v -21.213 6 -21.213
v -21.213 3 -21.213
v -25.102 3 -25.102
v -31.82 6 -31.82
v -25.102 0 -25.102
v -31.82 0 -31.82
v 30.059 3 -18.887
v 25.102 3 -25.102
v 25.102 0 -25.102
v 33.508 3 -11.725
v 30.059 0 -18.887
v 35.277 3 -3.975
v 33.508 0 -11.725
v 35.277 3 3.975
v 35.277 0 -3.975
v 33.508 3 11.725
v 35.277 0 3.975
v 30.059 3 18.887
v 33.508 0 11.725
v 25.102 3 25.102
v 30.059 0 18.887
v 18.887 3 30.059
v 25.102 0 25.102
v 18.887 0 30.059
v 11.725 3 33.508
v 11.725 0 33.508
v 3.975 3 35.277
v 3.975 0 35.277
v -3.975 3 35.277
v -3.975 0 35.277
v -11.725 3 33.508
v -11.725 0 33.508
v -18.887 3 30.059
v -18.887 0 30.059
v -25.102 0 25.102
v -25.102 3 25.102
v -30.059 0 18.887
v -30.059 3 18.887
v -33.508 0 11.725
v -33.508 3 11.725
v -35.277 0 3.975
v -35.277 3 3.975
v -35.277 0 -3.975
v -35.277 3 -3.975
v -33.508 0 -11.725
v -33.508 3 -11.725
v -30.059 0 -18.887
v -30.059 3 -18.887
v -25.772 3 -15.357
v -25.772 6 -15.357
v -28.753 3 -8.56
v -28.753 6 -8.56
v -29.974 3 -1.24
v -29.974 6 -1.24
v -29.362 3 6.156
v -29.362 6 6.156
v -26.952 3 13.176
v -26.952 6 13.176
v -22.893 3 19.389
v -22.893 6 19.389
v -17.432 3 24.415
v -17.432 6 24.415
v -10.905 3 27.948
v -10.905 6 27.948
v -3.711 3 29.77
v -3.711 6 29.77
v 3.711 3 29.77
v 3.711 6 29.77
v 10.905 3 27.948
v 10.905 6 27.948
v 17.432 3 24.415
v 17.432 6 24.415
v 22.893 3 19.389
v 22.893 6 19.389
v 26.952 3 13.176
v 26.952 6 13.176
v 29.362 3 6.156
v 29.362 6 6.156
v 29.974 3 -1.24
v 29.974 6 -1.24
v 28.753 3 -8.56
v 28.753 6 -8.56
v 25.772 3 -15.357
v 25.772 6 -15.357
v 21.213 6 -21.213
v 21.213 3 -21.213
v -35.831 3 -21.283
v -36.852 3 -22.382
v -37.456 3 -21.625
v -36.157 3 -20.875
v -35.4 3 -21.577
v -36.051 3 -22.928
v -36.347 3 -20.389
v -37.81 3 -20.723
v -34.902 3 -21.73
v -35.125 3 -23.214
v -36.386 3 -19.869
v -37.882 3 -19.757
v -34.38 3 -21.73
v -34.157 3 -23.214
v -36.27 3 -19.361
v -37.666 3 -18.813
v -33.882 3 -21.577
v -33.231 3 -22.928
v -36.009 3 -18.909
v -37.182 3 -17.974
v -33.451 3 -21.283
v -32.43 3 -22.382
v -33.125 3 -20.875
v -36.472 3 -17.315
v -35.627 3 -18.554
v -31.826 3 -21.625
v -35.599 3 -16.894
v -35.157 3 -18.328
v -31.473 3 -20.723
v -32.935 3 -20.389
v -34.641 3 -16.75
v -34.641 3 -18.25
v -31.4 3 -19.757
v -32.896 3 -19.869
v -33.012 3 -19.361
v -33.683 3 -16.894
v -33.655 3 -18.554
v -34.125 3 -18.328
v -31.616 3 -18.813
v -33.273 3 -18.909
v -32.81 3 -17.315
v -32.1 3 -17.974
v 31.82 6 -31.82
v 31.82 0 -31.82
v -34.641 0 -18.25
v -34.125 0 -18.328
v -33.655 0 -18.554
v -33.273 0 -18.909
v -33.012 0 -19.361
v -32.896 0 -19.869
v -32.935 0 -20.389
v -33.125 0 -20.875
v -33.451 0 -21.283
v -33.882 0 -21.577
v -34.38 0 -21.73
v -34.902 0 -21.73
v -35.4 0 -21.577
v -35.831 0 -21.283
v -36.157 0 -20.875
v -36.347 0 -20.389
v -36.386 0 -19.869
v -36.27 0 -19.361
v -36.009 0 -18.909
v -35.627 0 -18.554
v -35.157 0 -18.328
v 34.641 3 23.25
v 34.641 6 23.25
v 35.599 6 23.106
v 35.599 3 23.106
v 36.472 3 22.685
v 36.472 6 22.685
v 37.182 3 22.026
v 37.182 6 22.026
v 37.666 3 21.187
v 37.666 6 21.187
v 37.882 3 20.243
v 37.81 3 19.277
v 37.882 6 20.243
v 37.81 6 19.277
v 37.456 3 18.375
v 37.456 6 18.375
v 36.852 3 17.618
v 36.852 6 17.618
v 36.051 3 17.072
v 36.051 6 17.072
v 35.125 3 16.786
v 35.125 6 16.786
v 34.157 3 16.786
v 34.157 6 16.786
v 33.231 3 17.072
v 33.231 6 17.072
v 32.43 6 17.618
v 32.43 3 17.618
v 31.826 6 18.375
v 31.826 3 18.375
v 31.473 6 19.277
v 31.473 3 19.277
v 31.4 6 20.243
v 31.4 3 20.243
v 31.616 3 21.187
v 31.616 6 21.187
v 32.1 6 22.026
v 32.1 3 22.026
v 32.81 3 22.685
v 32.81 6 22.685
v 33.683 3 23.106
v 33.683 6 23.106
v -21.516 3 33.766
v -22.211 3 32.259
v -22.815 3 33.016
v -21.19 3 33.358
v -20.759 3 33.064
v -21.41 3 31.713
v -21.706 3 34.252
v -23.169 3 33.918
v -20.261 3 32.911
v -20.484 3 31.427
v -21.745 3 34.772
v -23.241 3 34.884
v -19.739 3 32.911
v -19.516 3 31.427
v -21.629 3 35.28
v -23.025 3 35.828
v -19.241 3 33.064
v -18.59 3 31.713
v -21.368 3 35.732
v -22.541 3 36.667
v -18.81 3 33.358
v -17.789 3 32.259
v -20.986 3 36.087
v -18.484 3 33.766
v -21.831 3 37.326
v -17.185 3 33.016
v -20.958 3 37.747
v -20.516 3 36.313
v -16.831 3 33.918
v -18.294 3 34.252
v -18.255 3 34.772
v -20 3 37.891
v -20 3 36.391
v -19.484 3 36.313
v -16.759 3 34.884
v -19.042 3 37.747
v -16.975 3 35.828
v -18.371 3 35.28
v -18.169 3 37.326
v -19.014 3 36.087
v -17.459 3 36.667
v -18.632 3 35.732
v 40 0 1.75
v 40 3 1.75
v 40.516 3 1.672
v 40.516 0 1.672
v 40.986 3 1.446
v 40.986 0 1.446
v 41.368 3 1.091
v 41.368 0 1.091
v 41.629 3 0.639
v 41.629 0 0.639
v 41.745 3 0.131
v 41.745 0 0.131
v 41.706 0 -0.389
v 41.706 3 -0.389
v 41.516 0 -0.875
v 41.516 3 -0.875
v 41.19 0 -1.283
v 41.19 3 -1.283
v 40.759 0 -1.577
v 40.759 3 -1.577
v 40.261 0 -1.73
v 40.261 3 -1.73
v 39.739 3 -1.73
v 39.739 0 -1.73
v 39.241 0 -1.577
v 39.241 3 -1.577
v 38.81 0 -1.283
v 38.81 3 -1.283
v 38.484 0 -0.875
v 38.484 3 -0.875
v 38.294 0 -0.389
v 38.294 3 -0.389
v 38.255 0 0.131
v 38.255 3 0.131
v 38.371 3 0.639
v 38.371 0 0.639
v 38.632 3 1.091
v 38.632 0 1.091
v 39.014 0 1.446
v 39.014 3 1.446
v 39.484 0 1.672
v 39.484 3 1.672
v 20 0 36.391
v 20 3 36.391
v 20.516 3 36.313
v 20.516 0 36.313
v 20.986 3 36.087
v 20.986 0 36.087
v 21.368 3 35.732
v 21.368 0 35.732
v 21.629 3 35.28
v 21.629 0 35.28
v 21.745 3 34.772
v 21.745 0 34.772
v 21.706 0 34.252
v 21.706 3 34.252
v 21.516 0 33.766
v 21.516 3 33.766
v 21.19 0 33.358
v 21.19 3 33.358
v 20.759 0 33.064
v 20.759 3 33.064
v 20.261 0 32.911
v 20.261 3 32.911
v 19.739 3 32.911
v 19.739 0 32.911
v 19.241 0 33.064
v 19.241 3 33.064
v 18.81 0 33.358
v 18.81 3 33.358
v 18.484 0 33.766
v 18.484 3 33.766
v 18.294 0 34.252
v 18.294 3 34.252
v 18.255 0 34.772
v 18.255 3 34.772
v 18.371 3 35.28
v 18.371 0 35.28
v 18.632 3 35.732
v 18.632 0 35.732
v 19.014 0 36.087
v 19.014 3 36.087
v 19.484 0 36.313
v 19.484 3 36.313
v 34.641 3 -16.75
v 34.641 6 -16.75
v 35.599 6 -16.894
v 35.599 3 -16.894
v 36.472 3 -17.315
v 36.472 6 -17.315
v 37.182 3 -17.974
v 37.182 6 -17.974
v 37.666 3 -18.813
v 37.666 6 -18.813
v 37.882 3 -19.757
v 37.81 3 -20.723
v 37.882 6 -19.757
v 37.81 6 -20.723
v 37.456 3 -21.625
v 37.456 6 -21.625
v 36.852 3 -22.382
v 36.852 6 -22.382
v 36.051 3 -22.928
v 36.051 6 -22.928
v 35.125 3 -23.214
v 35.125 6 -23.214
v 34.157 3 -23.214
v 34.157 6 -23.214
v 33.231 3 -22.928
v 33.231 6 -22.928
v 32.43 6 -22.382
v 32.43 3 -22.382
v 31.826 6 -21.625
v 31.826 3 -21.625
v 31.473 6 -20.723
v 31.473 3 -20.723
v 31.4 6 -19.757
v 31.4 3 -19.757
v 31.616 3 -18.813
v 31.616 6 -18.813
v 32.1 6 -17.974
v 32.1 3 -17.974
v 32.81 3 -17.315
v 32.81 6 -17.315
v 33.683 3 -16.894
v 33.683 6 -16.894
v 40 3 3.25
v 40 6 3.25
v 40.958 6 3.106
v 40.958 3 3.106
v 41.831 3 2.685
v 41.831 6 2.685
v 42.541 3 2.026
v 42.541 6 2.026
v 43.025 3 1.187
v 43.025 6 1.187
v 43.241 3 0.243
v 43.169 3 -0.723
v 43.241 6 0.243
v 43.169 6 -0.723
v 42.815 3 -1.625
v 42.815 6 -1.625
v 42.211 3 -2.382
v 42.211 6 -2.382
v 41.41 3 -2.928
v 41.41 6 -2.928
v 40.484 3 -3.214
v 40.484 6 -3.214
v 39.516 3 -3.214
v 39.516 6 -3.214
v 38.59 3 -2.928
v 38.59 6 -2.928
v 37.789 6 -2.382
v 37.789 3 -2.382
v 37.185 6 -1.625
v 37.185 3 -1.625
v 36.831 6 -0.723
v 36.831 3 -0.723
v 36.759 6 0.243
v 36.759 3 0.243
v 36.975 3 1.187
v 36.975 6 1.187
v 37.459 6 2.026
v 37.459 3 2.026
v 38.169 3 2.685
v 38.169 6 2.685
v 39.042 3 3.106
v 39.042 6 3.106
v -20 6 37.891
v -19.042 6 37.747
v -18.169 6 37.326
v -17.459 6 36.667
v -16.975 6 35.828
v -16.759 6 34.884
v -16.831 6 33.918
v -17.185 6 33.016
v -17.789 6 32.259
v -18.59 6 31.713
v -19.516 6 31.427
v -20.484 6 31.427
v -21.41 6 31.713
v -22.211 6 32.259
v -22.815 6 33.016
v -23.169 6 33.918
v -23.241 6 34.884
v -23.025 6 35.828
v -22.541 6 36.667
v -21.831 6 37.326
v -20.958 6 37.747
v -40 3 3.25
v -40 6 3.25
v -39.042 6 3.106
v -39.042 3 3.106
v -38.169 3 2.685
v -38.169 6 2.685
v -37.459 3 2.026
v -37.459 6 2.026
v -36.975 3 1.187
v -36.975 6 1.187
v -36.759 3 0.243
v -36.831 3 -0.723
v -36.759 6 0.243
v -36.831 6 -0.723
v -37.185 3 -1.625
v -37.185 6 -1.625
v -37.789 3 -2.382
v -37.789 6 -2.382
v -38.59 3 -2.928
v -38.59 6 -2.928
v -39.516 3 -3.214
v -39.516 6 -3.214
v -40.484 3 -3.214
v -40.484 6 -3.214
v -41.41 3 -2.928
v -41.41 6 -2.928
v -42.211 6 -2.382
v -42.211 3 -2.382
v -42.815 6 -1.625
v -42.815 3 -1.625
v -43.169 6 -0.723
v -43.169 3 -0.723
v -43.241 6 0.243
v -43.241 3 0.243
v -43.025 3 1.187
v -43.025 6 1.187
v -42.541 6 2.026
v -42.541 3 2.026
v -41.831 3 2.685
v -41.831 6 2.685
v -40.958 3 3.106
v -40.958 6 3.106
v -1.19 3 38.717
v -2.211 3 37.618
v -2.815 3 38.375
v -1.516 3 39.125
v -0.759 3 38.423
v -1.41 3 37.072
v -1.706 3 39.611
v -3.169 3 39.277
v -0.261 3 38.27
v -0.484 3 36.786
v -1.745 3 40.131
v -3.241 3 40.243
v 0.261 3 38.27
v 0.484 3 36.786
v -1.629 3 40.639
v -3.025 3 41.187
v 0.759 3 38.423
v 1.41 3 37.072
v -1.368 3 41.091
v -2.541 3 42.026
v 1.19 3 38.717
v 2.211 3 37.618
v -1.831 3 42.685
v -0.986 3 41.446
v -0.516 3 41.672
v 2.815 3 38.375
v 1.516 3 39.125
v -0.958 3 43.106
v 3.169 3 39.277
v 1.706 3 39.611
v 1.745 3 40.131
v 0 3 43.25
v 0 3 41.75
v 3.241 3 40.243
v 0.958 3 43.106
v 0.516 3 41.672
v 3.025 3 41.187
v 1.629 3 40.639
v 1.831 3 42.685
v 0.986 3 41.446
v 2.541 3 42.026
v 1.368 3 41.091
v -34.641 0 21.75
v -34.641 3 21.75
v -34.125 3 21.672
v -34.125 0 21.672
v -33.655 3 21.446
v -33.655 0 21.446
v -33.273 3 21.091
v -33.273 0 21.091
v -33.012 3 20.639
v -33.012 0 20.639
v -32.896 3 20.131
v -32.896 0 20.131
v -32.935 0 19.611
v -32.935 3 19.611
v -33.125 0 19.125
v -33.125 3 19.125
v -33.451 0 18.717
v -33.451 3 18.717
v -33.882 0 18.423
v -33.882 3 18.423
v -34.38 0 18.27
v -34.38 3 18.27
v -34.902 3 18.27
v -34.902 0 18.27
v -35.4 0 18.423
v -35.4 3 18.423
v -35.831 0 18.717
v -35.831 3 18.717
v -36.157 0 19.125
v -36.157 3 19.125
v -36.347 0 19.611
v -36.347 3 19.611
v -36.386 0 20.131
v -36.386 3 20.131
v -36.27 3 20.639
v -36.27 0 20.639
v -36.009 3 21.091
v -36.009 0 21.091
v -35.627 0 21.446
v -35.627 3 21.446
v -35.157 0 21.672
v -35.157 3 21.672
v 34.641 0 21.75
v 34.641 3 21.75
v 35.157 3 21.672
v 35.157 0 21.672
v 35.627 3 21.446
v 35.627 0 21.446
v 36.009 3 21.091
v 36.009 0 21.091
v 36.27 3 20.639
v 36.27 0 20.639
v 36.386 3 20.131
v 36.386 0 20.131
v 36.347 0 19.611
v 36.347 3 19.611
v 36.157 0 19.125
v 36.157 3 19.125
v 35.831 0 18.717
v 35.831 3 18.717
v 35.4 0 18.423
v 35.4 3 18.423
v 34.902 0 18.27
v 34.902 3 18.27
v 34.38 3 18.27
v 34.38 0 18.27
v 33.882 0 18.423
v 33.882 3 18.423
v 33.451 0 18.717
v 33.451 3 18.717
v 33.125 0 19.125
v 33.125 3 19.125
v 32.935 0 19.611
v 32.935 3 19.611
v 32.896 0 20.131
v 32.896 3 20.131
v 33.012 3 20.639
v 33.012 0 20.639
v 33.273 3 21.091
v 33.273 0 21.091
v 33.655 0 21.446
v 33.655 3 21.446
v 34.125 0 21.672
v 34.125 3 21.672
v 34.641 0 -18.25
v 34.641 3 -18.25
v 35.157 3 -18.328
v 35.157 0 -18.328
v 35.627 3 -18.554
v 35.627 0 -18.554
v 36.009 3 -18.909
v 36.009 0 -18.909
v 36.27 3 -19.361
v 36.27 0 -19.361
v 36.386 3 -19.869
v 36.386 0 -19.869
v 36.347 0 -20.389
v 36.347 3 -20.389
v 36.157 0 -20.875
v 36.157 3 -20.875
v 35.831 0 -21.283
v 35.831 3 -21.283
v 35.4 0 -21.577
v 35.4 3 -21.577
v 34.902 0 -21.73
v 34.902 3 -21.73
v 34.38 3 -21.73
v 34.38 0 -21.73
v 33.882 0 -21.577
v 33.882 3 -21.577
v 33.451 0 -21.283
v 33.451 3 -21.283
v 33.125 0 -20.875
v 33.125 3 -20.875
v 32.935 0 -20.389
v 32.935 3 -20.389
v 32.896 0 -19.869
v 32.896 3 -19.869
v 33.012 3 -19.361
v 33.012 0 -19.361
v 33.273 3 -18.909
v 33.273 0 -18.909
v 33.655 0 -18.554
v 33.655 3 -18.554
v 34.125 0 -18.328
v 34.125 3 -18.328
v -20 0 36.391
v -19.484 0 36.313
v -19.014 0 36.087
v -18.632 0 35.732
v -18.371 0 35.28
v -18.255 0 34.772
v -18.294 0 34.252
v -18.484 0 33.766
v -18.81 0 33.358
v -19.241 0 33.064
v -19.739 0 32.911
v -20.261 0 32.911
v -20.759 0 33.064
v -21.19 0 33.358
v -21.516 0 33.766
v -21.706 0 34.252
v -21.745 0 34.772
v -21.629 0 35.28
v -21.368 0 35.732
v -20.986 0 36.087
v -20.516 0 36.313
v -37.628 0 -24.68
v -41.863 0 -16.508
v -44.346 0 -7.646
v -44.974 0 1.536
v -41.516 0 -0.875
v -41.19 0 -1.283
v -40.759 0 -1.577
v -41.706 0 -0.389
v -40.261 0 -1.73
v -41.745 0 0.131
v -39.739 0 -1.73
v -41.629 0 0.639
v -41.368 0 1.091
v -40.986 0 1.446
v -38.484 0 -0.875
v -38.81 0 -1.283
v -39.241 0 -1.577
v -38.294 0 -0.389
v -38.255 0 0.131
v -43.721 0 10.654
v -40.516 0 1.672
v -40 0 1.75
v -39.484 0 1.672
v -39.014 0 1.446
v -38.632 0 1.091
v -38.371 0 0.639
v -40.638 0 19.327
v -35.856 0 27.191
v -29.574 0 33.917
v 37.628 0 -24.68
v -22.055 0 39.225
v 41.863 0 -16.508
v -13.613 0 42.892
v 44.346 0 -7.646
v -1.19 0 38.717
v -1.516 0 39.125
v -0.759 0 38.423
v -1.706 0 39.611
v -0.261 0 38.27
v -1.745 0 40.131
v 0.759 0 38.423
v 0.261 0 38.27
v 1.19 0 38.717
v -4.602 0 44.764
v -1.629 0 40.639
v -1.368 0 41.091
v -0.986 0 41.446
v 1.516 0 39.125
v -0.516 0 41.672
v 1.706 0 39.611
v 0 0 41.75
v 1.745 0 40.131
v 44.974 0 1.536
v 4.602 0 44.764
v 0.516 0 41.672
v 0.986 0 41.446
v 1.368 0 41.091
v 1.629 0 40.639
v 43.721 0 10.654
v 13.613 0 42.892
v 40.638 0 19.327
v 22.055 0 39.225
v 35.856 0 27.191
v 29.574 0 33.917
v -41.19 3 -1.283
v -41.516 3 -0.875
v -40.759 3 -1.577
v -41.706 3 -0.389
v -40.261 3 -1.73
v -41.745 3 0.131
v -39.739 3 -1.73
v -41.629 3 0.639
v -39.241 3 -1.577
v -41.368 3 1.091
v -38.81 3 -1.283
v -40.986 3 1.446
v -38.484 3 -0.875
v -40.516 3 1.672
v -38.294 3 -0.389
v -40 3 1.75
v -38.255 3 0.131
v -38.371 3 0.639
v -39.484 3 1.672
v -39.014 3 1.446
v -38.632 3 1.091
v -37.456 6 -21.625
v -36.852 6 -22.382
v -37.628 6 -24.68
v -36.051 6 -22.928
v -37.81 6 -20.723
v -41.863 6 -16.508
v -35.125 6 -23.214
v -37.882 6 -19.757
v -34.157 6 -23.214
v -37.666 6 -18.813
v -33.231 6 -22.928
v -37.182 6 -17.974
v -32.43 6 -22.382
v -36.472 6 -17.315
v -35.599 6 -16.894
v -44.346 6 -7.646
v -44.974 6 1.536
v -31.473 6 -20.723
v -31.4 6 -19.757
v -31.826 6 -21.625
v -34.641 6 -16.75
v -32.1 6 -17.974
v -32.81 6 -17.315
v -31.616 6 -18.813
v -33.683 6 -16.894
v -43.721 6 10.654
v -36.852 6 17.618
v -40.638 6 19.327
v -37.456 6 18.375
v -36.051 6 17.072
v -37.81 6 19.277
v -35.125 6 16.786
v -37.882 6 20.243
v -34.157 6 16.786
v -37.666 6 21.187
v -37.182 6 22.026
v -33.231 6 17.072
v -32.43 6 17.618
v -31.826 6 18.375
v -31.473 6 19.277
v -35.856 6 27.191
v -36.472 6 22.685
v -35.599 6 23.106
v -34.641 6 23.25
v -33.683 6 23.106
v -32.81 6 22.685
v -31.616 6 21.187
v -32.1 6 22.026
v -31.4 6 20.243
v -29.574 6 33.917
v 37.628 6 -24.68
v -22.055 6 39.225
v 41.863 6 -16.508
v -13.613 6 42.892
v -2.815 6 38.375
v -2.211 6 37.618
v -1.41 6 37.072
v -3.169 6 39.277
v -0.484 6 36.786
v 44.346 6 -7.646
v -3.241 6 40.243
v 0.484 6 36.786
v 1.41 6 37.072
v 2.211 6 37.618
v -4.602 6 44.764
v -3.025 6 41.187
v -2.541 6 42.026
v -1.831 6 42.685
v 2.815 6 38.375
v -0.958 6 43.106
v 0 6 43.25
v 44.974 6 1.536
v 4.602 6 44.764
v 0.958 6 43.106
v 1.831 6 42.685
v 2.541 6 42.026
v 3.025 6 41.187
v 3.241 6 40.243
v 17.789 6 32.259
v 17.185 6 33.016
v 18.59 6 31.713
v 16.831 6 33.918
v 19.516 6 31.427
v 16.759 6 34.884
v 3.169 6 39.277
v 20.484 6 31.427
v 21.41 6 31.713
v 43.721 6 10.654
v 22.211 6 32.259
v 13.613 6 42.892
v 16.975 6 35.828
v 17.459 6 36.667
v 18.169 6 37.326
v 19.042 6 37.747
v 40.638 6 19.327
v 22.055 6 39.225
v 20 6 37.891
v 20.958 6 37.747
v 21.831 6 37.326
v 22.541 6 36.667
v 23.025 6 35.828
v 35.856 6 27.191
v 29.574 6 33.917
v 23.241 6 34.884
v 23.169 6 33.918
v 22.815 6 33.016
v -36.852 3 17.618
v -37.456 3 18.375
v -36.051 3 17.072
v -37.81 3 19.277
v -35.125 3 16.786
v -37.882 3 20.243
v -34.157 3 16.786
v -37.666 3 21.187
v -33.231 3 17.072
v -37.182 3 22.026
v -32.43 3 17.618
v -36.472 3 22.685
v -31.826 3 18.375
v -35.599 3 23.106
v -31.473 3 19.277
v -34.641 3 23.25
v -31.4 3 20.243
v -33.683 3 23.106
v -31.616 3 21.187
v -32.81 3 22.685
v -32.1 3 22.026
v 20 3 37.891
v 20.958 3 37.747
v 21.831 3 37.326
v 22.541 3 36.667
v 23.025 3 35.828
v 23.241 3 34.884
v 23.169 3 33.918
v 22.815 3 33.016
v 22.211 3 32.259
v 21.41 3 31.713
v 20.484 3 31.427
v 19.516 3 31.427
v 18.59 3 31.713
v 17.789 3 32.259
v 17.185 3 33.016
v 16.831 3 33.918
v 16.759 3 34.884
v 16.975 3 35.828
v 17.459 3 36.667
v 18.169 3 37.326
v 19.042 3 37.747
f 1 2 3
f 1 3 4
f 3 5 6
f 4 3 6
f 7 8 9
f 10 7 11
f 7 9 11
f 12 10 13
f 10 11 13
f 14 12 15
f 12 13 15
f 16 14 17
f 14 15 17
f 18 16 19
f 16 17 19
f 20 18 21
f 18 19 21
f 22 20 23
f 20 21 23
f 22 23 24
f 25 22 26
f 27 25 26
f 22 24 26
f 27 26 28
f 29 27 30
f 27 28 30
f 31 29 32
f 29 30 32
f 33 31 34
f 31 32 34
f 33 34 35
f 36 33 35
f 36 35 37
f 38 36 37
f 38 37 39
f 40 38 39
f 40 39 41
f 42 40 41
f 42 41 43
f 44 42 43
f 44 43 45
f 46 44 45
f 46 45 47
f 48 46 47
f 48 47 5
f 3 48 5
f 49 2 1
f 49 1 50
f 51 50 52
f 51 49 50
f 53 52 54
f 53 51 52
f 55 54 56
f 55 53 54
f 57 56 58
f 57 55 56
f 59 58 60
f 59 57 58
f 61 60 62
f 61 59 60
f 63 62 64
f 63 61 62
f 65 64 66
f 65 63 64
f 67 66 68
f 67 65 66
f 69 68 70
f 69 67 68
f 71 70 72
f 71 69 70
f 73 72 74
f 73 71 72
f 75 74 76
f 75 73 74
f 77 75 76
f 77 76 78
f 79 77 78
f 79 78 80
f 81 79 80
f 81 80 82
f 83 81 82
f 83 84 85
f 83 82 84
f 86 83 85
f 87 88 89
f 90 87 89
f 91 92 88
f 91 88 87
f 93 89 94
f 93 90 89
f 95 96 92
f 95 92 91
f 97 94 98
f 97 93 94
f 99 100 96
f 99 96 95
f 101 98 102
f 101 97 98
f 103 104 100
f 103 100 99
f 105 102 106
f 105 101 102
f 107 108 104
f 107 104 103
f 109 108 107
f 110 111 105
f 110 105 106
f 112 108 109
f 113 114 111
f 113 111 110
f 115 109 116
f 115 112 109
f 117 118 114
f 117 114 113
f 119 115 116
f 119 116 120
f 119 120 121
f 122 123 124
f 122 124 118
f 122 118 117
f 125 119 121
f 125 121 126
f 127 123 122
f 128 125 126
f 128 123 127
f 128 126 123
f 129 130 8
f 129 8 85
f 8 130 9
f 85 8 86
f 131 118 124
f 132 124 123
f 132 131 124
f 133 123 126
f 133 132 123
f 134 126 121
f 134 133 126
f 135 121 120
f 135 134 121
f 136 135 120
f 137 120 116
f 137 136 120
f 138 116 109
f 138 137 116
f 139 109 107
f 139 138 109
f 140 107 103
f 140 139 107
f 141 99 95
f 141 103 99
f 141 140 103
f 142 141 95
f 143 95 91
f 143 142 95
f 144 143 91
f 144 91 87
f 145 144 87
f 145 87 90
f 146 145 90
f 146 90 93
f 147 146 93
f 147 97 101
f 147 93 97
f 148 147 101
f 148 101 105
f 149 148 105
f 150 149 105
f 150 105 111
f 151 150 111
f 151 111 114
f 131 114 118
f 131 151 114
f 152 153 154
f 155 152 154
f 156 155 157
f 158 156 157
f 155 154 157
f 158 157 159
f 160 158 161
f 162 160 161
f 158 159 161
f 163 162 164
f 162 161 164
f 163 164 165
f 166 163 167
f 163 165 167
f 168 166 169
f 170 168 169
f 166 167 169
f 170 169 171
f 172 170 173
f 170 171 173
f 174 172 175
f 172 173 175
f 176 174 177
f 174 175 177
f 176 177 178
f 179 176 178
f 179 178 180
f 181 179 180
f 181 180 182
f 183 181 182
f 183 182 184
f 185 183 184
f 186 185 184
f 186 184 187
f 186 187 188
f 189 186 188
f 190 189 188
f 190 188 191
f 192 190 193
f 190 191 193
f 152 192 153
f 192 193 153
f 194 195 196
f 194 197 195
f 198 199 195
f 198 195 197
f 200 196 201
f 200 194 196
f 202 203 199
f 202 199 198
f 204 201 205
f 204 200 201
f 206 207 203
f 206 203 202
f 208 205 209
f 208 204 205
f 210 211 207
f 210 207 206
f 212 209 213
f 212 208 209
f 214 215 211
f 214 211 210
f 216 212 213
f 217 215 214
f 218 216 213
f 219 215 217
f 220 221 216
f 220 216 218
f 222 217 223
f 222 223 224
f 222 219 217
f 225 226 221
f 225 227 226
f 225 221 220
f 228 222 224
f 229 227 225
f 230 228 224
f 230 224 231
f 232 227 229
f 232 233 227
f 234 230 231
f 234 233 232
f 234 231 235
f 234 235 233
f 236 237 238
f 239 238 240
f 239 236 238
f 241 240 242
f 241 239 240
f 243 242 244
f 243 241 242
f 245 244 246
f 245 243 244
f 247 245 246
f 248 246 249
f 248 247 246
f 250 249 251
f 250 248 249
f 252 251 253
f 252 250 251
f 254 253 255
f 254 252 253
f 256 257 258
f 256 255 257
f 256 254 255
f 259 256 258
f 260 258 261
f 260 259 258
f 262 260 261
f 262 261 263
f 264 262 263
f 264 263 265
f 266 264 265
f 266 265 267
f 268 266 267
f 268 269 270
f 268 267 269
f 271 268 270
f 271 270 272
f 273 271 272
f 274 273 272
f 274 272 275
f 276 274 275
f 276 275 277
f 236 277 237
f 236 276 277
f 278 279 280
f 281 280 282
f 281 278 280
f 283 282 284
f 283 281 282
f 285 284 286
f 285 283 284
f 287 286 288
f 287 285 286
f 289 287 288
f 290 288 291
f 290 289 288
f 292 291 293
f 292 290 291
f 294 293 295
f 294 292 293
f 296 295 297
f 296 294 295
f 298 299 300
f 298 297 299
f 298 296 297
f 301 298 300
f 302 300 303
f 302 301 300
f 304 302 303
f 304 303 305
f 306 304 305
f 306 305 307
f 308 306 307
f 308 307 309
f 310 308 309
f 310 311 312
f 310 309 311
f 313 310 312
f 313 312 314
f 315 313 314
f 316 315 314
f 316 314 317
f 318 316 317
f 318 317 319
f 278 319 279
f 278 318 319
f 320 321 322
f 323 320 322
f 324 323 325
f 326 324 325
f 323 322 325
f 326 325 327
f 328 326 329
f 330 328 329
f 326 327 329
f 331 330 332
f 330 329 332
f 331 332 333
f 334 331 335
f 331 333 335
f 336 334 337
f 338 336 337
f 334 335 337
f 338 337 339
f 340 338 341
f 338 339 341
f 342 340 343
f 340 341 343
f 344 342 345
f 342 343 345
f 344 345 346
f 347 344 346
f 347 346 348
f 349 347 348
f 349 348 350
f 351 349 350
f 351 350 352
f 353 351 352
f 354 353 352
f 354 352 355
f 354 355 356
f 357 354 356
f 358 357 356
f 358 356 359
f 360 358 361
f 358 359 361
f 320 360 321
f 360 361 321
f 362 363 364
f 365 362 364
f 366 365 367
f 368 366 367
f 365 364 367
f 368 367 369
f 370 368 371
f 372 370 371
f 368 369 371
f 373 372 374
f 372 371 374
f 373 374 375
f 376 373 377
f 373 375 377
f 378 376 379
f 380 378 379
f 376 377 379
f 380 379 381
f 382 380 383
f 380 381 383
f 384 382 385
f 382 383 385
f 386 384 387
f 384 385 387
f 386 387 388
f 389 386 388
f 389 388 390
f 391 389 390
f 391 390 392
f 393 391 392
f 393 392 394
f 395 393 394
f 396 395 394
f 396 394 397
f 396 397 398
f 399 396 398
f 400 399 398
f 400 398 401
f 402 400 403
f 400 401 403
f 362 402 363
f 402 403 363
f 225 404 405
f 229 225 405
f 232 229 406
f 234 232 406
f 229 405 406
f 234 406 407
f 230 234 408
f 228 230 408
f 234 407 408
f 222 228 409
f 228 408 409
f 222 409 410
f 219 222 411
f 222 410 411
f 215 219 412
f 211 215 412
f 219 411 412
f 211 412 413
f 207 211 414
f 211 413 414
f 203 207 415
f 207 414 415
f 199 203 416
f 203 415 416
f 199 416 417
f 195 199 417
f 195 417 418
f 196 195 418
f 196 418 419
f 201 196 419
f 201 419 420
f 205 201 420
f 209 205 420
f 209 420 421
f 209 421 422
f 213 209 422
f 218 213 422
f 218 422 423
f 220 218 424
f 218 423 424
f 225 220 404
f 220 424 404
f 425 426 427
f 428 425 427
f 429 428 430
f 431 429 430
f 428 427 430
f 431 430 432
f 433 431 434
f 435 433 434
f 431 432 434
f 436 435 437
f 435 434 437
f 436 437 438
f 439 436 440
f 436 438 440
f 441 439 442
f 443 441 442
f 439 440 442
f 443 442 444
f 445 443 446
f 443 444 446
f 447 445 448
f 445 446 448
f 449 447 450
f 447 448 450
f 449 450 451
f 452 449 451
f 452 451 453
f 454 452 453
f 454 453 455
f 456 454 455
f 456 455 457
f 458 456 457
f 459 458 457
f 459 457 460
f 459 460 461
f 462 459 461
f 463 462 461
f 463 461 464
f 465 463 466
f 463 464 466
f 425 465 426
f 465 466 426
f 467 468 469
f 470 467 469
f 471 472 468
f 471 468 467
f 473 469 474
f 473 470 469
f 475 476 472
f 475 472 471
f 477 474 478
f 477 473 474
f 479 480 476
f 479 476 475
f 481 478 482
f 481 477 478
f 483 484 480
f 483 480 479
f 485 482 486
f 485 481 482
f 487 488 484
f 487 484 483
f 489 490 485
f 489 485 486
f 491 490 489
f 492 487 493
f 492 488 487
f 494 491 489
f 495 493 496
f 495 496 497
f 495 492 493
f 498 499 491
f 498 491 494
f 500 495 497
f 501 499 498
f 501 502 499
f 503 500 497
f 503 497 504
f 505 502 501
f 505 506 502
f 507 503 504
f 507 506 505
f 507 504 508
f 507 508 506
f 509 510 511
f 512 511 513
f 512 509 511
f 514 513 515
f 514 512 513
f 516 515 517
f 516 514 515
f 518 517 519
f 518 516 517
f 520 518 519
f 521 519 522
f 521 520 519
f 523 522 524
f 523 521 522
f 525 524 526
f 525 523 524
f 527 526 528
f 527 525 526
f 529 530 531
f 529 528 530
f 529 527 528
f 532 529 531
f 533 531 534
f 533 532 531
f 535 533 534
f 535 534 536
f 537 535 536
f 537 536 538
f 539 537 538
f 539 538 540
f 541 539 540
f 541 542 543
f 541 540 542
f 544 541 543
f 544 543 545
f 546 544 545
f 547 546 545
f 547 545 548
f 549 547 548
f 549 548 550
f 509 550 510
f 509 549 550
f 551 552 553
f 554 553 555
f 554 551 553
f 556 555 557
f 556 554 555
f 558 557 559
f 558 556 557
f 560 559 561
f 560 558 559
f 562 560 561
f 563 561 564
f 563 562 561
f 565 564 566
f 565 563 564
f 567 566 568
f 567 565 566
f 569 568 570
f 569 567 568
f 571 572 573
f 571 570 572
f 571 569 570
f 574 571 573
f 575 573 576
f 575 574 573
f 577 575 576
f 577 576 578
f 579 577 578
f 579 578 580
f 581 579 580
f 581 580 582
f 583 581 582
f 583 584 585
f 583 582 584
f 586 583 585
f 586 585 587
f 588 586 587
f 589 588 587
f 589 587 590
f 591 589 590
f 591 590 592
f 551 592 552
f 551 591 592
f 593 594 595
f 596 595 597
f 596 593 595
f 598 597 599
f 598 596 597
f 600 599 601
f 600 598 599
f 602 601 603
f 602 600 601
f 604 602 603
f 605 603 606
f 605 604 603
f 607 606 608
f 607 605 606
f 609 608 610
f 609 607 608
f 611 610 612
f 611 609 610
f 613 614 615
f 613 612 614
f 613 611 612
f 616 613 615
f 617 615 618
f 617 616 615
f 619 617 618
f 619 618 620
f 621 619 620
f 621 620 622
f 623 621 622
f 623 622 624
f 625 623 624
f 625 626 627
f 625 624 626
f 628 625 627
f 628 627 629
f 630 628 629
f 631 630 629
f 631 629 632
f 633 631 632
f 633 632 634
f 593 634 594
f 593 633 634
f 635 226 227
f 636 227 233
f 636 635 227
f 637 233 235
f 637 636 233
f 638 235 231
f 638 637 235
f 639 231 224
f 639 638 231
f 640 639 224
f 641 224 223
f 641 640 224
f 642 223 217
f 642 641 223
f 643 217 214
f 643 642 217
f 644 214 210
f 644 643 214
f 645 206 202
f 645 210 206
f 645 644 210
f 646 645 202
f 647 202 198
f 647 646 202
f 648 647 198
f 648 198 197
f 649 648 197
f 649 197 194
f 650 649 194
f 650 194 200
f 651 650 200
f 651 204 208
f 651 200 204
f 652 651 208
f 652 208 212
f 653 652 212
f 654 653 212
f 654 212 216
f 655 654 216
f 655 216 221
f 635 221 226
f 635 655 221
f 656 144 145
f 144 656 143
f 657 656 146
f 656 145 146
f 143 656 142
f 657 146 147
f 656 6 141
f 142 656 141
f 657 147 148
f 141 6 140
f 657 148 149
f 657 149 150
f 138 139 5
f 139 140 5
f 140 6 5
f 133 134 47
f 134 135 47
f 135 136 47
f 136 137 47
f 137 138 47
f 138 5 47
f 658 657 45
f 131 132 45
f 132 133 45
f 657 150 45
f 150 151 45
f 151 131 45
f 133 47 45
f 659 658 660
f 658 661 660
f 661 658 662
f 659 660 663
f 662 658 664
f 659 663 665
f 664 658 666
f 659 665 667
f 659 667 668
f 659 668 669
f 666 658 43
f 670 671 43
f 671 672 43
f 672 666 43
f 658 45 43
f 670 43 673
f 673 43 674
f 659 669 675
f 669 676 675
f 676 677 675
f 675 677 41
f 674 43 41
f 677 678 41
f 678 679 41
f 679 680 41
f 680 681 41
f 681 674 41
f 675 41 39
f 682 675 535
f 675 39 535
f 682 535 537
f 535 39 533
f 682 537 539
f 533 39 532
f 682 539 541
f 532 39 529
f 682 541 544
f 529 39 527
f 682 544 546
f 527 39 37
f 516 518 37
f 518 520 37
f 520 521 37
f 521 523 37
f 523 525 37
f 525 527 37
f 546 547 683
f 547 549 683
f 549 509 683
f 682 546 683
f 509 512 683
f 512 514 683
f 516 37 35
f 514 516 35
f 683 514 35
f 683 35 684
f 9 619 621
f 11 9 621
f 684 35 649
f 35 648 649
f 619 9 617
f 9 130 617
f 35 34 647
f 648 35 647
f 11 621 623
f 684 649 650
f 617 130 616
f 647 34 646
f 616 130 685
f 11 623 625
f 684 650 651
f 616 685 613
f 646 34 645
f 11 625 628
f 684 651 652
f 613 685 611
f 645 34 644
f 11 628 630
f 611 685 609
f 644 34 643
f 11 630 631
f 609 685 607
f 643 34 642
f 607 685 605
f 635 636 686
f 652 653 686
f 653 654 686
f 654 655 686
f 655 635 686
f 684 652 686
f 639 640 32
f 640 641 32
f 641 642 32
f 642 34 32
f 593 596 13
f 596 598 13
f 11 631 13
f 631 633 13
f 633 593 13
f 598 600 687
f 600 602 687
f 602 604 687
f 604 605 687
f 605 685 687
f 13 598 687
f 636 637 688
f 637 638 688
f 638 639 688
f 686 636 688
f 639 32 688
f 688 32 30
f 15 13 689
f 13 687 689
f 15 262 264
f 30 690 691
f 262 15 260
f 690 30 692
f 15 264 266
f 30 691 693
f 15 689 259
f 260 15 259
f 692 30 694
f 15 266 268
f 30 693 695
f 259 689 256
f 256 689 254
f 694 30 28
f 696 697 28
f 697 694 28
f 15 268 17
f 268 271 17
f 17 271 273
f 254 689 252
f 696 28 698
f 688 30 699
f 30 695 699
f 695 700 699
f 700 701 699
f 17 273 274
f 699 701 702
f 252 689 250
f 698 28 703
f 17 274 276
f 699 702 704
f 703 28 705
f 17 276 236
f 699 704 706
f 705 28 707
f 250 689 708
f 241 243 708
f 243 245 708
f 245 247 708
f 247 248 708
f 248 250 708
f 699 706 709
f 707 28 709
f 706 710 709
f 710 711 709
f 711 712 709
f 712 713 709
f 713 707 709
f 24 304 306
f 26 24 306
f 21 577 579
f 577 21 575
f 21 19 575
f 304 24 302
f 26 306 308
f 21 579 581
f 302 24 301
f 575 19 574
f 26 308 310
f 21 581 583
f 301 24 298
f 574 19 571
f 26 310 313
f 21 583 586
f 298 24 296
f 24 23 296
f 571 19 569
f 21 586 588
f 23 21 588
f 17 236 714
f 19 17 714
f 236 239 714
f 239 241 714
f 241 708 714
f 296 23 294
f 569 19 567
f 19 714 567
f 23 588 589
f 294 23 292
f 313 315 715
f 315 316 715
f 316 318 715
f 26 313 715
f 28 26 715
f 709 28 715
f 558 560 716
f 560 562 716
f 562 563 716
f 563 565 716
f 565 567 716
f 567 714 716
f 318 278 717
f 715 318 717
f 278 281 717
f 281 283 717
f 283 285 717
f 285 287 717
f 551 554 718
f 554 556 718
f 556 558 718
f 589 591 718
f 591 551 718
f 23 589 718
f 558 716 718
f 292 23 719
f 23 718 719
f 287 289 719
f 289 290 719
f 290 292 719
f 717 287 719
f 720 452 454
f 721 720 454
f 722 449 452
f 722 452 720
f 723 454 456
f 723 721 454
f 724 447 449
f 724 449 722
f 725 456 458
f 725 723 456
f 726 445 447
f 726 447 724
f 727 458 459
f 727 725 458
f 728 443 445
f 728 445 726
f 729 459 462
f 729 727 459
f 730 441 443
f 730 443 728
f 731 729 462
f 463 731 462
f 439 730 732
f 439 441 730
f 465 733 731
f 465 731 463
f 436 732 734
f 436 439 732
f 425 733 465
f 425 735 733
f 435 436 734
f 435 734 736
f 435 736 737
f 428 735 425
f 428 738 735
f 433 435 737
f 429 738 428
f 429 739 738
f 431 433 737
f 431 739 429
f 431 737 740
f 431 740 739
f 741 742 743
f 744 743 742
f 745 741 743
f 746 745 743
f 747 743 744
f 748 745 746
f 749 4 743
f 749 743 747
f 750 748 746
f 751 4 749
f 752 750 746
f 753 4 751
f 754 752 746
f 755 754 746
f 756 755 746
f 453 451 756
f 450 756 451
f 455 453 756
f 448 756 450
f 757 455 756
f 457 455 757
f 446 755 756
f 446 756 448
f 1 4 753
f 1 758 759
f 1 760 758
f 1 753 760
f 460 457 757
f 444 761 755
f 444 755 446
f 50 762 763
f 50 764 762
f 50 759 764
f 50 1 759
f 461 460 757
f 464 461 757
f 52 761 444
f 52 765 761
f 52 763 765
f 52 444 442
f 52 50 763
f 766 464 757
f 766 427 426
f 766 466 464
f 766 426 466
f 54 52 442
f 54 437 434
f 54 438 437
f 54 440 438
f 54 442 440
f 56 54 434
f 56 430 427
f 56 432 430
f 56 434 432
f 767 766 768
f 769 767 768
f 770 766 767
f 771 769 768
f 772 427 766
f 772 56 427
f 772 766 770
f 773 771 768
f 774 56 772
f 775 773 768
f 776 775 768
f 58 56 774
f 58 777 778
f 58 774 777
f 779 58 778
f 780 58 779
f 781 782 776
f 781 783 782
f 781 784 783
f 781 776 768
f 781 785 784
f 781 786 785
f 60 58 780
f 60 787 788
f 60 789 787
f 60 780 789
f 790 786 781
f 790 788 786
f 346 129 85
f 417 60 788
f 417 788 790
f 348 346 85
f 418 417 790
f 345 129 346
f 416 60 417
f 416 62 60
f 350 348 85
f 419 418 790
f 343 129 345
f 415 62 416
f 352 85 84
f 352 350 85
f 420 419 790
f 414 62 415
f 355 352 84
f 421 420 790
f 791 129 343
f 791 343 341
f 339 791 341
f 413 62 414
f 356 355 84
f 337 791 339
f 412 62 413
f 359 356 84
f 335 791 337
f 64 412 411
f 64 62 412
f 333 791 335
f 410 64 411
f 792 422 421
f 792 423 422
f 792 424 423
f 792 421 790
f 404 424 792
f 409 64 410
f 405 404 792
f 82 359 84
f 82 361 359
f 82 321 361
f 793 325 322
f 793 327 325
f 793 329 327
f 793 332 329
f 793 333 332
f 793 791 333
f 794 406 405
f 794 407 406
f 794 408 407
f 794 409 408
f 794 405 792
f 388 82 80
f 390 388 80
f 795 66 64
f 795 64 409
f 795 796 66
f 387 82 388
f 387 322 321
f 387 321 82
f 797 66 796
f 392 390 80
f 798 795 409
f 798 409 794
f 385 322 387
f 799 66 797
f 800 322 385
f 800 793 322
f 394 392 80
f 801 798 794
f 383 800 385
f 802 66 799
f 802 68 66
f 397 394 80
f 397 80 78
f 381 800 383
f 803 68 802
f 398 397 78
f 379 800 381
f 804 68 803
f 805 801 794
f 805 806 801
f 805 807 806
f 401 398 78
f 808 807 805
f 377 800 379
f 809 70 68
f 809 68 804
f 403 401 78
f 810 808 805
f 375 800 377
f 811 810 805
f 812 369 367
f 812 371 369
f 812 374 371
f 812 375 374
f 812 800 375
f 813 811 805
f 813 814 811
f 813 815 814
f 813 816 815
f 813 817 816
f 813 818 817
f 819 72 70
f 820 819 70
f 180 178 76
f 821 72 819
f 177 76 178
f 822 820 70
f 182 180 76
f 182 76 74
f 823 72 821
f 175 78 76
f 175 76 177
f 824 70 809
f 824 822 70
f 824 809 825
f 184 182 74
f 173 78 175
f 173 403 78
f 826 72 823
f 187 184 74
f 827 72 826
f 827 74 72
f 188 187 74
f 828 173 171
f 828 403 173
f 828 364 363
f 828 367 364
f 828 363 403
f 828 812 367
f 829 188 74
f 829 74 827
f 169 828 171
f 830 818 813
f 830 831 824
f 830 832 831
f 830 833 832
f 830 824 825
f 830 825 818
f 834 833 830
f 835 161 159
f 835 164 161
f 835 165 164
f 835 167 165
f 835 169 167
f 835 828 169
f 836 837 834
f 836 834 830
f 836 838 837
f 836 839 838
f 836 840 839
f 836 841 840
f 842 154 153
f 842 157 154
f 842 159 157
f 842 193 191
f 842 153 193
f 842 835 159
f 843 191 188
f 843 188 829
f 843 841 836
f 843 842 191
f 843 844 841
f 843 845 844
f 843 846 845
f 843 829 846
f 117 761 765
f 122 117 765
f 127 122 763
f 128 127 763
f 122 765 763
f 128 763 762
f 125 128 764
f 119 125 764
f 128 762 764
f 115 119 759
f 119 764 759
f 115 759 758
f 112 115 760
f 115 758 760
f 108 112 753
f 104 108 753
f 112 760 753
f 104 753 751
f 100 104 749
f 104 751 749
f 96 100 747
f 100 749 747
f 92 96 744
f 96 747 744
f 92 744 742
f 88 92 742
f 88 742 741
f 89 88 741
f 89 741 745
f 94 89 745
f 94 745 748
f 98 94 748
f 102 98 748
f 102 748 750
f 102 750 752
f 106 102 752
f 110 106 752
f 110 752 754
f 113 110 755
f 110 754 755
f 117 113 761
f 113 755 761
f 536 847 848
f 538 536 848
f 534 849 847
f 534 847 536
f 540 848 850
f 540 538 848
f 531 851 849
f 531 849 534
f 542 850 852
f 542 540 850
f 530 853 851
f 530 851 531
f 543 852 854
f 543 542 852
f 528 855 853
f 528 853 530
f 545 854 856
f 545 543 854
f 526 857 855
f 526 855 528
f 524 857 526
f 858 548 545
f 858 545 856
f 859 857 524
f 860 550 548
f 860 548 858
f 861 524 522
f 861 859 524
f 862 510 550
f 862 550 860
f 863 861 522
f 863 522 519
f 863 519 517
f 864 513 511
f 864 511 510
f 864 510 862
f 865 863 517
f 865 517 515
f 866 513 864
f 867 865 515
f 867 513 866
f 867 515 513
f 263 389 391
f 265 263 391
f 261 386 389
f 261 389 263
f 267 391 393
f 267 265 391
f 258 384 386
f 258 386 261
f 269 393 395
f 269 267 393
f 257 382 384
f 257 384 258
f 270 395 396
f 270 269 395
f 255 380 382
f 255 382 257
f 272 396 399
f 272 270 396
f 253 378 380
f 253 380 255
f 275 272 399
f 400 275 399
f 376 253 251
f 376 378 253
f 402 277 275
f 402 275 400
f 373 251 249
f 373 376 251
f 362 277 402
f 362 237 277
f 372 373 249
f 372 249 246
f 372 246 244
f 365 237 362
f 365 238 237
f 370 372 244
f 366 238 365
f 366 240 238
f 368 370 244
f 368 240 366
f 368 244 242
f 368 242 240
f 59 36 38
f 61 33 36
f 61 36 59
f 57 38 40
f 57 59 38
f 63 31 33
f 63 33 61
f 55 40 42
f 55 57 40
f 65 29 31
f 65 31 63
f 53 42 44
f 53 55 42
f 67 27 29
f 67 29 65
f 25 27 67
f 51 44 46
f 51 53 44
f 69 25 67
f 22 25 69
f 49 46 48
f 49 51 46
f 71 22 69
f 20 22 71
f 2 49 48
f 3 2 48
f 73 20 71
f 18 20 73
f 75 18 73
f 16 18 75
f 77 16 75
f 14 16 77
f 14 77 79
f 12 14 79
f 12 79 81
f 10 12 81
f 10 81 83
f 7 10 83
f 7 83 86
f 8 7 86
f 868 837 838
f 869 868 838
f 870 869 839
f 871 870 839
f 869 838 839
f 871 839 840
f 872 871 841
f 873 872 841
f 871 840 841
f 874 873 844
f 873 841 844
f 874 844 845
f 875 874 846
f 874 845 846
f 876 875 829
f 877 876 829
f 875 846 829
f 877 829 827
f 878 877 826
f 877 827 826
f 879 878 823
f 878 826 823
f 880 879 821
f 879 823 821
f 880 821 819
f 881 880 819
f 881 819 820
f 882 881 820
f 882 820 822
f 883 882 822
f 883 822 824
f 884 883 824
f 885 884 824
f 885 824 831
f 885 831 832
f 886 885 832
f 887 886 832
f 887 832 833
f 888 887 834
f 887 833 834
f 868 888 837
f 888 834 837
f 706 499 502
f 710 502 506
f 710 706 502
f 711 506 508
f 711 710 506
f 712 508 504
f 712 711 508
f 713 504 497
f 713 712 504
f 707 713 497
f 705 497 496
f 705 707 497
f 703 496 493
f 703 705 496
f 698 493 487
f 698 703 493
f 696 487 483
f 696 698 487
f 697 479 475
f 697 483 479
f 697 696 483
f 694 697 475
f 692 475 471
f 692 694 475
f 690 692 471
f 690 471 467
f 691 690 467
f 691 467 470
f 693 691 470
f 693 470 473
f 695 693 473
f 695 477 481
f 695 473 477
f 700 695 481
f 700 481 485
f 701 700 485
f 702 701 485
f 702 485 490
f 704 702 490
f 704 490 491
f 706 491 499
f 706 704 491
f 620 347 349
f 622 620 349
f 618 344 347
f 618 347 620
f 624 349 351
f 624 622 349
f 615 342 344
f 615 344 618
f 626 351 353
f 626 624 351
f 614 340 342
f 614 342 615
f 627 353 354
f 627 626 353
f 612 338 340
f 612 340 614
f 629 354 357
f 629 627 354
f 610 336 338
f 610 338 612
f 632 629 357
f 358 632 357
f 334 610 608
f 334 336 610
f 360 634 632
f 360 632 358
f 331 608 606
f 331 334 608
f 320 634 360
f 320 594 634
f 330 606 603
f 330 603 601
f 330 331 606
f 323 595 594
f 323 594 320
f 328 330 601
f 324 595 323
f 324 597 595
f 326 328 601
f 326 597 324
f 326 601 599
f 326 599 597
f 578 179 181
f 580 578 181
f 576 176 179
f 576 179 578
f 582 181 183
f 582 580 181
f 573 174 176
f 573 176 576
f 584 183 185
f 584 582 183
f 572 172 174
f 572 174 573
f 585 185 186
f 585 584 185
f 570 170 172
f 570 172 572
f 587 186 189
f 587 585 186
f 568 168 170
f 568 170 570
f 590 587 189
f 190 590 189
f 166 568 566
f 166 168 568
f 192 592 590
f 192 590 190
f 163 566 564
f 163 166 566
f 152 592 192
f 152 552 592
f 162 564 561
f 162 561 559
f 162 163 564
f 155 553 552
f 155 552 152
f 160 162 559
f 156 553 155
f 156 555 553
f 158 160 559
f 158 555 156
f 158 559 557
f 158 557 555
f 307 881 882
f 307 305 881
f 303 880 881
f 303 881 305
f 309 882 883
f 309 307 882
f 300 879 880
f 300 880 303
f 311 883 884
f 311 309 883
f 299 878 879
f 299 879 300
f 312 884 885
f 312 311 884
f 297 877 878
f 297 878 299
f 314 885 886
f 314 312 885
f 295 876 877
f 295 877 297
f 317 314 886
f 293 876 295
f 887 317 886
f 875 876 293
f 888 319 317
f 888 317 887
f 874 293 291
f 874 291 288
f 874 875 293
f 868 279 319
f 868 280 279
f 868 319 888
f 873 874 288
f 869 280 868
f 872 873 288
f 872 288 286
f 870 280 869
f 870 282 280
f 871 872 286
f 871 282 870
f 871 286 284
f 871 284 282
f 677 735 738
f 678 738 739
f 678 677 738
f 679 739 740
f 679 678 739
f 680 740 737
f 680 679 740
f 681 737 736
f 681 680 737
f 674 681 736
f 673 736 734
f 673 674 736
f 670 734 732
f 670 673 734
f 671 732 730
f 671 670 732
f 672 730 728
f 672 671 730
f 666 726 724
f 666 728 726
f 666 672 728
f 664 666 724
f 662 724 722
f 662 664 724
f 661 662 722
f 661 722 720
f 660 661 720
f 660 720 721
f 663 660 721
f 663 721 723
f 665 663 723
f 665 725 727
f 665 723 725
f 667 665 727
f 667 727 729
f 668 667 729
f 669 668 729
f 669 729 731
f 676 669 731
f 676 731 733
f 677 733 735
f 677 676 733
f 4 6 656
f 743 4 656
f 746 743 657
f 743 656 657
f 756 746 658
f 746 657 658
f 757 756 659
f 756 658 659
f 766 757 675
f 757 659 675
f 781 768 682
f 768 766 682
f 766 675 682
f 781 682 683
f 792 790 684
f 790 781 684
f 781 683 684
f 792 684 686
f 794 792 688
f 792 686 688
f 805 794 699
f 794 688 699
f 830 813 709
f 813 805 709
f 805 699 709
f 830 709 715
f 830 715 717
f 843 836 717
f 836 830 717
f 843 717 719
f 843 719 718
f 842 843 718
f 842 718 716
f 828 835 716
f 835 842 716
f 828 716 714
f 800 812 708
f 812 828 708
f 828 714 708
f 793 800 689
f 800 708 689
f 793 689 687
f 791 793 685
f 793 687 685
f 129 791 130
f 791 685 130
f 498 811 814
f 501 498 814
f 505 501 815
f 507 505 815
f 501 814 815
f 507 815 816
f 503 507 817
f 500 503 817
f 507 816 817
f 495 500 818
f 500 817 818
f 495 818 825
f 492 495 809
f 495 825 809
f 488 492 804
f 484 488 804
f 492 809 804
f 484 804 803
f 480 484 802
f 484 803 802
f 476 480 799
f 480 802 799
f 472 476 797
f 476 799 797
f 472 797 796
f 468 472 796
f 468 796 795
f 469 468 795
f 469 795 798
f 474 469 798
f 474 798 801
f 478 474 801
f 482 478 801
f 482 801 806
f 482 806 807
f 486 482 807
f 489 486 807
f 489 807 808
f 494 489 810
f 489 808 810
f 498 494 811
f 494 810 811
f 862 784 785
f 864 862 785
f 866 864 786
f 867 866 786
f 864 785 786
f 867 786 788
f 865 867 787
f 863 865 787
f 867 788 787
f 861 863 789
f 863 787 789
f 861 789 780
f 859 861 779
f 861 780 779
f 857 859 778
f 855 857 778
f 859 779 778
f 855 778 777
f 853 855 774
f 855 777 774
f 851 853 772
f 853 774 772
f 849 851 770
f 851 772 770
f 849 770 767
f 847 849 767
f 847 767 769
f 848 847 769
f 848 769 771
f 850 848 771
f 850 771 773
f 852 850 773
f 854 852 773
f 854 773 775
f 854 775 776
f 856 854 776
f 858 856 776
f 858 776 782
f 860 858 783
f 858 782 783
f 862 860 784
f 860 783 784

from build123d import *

# Parameters (mm, degrees)
SKETCH1_R           = 45
SKETCH1_R_2         = 30
SKETCH1_R_3         = 1.75
BOSS_EXTRUDE1_DEPTH = 6
SKETCH2_R           = 35.5
CUT_EXTRUDE1_DEPTH  = 3
SKETCH3_R           = 3.25
CUT_EXTRUDE2_DEPTH  = 3
CUT_EXTRUDE4_DEPTH  = 10


with BuildPart() as part:
    # Sketch1 → Boss-Extrude1 (new body)
    with BuildSketch(Plane(origin=(0, 0, 0), x_dir=(1, 0, 0), z_dir=(0, 1, 0))):
        with Locations(Location((0, 0, 0), (0, 0, 270))):
            Circle(SKETCH1_R)
        with Locations(Location((0, 0, 0), (0, 0, 270))):
            Circle(SKETCH1_R_2, mode=Mode.SUBTRACT)
        with Locations(Location((0, 40, 0), (0, 0, 270))):
            Circle(SKETCH1_R_3, mode=Mode.SUBTRACT)
        with Locations(Location((20, 34.641016151, 0), (0, 0, 270))):
            Circle(SKETCH1_R_3, mode=Mode.SUBTRACT)
        with Locations(Location((34.641016151, 20, 0), (0, 0, 270))):
            Circle(SKETCH1_R_3, mode=Mode.SUBTRACT)
        with Locations(Location((40, 0, 0), (0, 0, 270))):
            Circle(SKETCH1_R_3, mode=Mode.SUBTRACT)
        with Locations(Location((34.641016151, -20, 0), (0, 0, 270))):
            Circle(SKETCH1_R_3, mode=Mode.SUBTRACT)
        with Locations(Location((20, -34.641016151, 0), (0, 0, 270))):
            Circle(SKETCH1_R_3, mode=Mode.SUBTRACT)
        with Locations(Location((0, -40, 0), (0, 0, 270))):
            Circle(SKETCH1_R_3, mode=Mode.SUBTRACT)
        with Locations(Location((-20, -34.641016151, 0), (0, 0, 270))):
            Circle(SKETCH1_R_3, mode=Mode.SUBTRACT)
        with Locations(Location((-34.641016151, -20, 0), (0, 0, 270))):
            Circle(SKETCH1_R_3, mode=Mode.SUBTRACT)
        with Locations(Location((-40, 0, 0), (0, 0, 270))):
            Circle(SKETCH1_R_3, mode=Mode.SUBTRACT)
        with Locations(Location((-34.641016151, 20, 0), (0, 0, 270))):
            Circle(SKETCH1_R_3, mode=Mode.SUBTRACT)
        with Locations(Location((-20, 34.641016151, 0), (0, 0, 270))):
            Circle(SKETCH1_R_3, mode=Mode.SUBTRACT)
    extrude(amount=BOSS_EXTRUDE1_DEPTH)

    # Sketch2 → Cut-Extrude1 (cut)
    with BuildSketch(Plane.XZ):
        with Locations(Location((0, 0, 0), (0, 0, 270))):
            Circle(SKETCH2_R)
    extrude(amount=-CUT_EXTRUDE1_DEPTH, mode=Mode.SUBTRACT)

    # Sketch3 → Cut-Extrude2 (cut)
    with BuildSketch(Plane(origin=(0, 6, 0), x_dir=(1, 0, 0), z_dir=(0, 1, 0))):
        with Locations(Location((40, 0, 0), (0, 0, 270))):
            Circle(SKETCH3_R)
        with Locations(Location((34.641016151, -20, 0), (0, 0, 270))):
            Circle(SKETCH3_R)
        with Locations(Location((20, -34.641016151, 0), (0, 0, 270))):
            Circle(SKETCH3_R)
        with Locations(Location((0, -40, 0), (0, 0, 270))):
            Circle(SKETCH3_R)
        with Locations(Location((-20, -34.641016151, 0), (0, 0, 270))):
            Circle(SKETCH3_R)
        with Locations(Location((-34.641016151, -20, 0), (0, 0, 270))):
            Circle(SKETCH3_R)
        with Locations(Location((-40, 0, 0), (0, 0, 270))):
            Circle(SKETCH3_R)
        with Locations(Location((-34.641016151, 20, 0), (0, 0, 270))):
            Circle(SKETCH3_R)
        with Locations(Location((-20, 34.641016151, 0), (0, 0, 270))):
            Circle(SKETCH3_R)
        with Locations(Location((0, 40, 0), (0, 0, 270))):
            Circle(SKETCH3_R)
        with Locations(Location((20, 34.641016151, 0), (0, 0, 270))):
            Circle(SKETCH3_R)
        with Locations(Location((34.641016151, 20, 0), (0, 0, 270))):
            Circle(SKETCH3_R)
    extrude(amount=-CUT_EXTRUDE2_DEPTH, mode=Mode.SUBTRACT)

    # Sketch5 → Cut-Extrude4 (cut)
    with BuildSketch(Plane(origin=(0, 0, 0), x_dir=(1, 0, 0), z_dir=(0, 1, 0))):
        with BuildLine():
            Line((38.890872965, 38.890872965), (0, 0))
            Line((0, 0), (-38.890872965, 38.890872965))
            ThreePointArc((-38.890872965, 38.890872965), (0, 55), (38.890872965, 38.890872965))
        make_face()
    extrude(amount=CUT_EXTRUDE4_DEPTH, mode=Mode.SUBTRACT)


solid = part.part
